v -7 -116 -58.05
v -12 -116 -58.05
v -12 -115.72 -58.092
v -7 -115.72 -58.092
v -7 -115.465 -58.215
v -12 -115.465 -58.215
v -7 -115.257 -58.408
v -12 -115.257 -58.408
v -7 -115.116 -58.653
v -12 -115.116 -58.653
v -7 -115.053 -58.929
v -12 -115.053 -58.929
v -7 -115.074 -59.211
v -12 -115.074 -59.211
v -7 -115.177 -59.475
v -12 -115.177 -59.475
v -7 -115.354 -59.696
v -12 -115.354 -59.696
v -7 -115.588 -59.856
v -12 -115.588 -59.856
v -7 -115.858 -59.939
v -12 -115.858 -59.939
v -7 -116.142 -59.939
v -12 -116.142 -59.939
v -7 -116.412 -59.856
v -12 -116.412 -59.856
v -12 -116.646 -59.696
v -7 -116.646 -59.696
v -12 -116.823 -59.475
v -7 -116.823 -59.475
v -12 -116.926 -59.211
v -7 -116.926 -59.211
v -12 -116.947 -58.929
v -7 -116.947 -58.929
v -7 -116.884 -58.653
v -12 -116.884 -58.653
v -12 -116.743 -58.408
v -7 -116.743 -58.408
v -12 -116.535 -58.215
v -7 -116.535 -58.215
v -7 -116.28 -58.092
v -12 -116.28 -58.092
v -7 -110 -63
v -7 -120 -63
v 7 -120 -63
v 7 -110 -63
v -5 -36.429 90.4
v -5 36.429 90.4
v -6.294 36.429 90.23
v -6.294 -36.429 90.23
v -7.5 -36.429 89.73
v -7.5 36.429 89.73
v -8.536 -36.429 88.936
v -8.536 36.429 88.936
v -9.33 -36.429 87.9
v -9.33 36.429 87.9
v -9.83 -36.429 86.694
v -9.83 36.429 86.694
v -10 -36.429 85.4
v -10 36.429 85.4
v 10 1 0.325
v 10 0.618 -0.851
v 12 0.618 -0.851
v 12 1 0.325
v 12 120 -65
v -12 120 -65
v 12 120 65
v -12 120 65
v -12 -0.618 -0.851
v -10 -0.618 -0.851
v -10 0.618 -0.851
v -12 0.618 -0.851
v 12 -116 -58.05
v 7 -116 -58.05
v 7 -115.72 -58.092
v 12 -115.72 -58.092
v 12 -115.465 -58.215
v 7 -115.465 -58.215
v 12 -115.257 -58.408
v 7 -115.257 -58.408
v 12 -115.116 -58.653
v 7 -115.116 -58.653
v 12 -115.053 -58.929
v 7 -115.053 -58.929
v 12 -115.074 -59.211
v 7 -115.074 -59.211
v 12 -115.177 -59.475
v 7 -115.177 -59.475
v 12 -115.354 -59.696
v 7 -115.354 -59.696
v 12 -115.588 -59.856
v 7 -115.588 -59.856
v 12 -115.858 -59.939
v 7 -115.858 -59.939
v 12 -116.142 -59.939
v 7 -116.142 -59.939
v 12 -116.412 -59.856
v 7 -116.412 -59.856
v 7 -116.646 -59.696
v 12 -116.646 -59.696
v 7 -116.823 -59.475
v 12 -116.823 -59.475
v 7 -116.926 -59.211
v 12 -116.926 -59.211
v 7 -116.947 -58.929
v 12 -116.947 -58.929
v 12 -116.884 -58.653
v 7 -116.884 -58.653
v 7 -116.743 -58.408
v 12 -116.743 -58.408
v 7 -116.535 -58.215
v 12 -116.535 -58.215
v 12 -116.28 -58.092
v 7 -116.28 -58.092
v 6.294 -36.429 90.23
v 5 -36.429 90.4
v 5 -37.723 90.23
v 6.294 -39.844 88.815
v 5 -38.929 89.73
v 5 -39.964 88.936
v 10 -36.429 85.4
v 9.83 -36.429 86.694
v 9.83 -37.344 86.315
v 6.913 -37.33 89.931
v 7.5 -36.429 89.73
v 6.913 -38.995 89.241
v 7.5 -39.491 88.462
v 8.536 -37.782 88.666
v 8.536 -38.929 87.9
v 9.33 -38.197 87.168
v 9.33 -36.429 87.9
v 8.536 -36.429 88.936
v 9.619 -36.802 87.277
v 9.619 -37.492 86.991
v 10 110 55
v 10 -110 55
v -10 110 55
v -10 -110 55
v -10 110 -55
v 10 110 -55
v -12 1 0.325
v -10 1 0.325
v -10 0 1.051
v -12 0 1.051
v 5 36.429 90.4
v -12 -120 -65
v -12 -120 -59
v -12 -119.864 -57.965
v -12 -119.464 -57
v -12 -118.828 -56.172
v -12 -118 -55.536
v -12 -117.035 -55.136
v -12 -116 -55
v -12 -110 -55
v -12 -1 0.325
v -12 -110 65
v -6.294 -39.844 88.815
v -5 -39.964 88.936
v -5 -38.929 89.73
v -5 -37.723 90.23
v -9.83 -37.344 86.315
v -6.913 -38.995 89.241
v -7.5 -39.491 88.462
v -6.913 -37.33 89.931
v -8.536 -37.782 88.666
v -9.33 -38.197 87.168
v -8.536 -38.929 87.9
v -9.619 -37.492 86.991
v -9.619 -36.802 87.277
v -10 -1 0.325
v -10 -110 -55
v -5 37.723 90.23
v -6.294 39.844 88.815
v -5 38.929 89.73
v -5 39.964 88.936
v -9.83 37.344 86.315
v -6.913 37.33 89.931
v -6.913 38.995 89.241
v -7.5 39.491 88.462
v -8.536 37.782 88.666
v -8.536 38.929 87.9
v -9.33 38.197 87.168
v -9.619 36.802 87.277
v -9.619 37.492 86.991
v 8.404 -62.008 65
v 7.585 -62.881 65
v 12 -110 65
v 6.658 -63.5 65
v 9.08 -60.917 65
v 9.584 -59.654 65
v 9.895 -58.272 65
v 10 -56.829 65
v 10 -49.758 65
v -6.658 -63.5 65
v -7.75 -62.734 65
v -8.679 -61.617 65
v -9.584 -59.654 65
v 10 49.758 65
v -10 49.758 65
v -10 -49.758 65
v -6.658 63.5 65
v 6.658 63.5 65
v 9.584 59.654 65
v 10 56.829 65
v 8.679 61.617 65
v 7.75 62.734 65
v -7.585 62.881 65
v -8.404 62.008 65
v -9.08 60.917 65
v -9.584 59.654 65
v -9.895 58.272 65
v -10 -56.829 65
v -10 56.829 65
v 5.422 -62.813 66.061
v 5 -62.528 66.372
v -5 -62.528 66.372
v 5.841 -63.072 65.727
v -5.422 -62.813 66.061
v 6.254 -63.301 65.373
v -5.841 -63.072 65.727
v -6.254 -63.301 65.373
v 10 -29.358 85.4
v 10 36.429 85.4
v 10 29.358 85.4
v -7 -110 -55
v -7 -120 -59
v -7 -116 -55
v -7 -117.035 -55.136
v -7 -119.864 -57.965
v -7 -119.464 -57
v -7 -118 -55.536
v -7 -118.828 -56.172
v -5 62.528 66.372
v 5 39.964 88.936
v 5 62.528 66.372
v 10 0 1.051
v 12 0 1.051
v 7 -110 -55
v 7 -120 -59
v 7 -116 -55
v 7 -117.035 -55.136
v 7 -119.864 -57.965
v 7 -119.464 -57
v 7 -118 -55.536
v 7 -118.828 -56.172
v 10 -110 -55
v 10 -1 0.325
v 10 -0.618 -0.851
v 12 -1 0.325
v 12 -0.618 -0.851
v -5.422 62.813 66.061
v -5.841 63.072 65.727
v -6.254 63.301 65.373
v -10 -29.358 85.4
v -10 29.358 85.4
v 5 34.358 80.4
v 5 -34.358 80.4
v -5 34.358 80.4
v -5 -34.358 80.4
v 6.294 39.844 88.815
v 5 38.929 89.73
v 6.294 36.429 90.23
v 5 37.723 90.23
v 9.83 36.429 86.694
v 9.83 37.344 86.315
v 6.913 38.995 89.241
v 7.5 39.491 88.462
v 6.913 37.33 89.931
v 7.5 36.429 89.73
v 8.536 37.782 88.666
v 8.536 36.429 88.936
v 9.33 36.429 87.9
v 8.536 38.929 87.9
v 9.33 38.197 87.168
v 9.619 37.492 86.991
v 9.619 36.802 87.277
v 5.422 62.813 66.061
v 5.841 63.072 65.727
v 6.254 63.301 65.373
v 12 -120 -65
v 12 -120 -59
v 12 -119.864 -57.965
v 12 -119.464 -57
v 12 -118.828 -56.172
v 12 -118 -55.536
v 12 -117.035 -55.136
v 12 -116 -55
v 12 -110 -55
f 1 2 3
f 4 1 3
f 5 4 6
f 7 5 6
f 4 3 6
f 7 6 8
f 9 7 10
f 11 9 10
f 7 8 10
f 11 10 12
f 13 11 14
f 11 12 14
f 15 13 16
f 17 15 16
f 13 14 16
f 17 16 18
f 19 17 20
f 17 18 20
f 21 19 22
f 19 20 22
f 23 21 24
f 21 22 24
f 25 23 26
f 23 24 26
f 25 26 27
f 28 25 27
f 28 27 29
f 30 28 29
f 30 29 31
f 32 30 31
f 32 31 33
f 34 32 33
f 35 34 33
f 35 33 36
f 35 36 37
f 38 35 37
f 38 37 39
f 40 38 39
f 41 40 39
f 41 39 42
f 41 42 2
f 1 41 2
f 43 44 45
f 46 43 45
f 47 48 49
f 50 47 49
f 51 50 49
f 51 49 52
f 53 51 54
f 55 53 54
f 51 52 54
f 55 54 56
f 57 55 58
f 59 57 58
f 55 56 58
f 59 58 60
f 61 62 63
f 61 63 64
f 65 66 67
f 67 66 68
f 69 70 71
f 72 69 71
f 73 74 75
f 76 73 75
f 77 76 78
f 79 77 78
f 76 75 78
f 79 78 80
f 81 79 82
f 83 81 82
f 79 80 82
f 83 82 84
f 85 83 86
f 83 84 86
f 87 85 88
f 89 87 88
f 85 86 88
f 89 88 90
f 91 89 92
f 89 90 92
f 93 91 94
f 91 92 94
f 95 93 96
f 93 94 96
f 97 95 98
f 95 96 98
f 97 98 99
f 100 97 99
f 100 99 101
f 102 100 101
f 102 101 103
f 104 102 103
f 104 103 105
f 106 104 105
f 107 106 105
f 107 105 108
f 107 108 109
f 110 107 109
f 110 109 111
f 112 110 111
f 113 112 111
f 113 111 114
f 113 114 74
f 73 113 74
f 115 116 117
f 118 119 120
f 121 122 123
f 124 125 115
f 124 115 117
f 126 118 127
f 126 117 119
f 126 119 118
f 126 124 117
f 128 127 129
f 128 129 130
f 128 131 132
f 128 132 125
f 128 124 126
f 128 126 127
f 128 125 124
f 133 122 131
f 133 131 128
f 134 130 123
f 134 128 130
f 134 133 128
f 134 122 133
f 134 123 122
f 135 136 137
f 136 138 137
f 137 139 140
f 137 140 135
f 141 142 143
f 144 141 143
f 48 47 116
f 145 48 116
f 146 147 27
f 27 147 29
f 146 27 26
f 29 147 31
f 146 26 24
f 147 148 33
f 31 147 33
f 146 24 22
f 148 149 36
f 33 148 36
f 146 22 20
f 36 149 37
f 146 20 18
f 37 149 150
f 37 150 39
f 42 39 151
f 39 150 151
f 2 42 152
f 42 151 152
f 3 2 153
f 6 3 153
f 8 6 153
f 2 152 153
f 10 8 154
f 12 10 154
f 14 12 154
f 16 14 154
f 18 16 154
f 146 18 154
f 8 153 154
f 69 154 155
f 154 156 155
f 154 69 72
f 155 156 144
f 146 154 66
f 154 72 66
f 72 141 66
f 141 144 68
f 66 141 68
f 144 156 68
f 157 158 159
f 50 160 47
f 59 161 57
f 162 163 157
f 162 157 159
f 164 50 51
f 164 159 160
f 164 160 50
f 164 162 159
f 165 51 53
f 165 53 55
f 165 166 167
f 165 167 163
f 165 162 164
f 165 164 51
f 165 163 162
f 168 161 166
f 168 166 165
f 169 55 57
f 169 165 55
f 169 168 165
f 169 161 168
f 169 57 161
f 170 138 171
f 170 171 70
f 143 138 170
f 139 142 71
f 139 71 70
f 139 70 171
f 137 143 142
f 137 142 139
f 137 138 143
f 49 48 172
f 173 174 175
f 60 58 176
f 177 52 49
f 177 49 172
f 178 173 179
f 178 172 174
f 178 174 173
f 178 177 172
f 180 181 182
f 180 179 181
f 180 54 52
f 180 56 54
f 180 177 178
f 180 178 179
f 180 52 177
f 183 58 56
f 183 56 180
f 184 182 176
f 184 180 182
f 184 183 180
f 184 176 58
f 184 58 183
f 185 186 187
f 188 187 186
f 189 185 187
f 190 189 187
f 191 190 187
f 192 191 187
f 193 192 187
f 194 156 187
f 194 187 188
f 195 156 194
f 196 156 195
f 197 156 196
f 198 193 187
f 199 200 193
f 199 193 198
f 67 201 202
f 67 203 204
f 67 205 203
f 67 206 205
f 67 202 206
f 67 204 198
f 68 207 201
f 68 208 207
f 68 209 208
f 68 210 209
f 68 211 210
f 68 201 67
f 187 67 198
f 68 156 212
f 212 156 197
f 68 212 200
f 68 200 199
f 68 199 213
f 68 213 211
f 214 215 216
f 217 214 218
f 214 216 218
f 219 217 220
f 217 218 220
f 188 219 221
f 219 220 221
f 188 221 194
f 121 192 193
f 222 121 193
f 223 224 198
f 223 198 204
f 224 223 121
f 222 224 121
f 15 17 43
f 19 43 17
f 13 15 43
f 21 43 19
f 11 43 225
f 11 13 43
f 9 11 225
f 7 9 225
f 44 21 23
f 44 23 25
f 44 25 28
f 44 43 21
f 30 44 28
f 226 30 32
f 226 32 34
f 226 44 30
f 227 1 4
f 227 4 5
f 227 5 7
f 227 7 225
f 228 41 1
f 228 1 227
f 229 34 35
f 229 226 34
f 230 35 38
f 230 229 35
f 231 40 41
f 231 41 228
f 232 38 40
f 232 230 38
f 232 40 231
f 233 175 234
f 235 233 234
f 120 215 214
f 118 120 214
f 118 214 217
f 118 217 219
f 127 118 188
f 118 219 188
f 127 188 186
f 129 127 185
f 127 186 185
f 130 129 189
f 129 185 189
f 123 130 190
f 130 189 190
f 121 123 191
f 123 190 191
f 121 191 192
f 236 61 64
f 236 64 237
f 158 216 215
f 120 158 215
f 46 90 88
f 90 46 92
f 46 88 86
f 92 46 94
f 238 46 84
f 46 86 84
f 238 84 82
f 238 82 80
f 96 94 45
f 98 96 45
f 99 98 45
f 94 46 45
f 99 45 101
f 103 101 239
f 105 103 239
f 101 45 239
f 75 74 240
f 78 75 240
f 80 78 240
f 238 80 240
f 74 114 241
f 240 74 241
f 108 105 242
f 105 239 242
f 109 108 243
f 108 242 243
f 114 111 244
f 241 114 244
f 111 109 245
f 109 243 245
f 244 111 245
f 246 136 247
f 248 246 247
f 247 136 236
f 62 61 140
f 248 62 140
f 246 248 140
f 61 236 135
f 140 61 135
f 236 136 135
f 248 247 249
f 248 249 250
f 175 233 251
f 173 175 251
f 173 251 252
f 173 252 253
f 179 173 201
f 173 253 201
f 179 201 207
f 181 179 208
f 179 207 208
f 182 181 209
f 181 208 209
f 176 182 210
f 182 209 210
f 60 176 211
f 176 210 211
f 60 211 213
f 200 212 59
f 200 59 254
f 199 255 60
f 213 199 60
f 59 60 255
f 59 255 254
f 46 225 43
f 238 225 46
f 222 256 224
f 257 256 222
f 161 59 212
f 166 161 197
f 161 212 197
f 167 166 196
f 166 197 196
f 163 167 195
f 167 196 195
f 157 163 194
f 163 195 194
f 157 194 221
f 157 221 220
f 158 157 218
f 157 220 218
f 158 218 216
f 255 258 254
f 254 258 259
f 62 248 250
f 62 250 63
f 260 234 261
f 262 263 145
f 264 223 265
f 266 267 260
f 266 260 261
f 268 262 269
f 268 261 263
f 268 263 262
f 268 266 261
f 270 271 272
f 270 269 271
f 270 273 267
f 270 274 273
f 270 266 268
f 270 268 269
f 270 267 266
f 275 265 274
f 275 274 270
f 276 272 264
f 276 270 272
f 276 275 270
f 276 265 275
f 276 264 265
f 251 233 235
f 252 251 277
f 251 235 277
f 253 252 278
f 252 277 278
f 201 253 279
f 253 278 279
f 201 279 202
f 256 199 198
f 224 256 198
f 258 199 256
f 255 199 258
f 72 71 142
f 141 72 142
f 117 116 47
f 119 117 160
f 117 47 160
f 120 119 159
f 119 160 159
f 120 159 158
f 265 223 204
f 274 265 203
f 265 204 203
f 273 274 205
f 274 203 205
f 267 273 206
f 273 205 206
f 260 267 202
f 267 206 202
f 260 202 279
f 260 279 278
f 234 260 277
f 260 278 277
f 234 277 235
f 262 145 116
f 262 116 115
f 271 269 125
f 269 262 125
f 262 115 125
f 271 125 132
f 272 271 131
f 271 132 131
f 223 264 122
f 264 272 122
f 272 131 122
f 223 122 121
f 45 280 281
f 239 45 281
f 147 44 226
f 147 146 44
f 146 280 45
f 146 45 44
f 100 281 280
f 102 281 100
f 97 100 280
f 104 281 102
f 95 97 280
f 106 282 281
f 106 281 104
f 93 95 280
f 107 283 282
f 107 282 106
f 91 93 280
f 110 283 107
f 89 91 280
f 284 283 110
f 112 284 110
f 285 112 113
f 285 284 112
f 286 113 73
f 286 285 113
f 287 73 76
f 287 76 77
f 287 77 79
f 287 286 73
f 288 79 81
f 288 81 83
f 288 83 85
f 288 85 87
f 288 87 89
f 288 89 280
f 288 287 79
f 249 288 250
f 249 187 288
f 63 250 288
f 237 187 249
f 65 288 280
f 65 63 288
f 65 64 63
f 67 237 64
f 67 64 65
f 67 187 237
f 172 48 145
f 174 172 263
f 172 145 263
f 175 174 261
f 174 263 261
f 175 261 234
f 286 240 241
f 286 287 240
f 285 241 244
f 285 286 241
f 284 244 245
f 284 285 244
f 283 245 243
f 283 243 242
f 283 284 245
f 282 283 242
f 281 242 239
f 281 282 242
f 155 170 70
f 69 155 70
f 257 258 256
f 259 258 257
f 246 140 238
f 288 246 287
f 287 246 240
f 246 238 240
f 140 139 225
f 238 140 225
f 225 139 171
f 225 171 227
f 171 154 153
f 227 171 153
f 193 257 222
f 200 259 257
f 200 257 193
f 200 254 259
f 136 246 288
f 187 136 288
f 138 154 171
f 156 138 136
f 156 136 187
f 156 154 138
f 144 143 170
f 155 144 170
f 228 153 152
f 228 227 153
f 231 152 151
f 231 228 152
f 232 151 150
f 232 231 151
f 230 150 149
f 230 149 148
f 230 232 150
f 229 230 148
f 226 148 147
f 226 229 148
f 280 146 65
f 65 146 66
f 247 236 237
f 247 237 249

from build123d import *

# Parameters (mm, degrees)
SKETCH1_W           = 240
SKETCH1_H           = 130
BOSS_EXTRUDE1_DEPTH = 12
SKETCH2_W           = 220
SKETCH2_H           = 110
CUT_EXTRUDE2_DEPTH  = 10
CUT_EXTRUDE3_DEPTH  = 137.839321834
SKETCH4_W           = 20
SKETCH4_H           = 127
BOSS_EXTRUDE2_DEPTH = 25.4
CHAMFER1_SIZE       = 25
SHELL1_START        = -10
SHELL1_DEPTH        = 20
FILLET1_R           = 5
CHAMFER2_SIZE       = 5
SKETCH6_W           = 10
SKETCH6_H           = 120
CUT_EXTRUDE5_DEPTH  = 153.145193812
SKETCH9_W           = 14
SKETCH9_H           = 8
CUT_EXTRUDE7_DEPTH  = 10
SKETCH11_R          = 0.95
CUT_EXTRUDE8_DEPTH  = 153.145193812
FILLET3_R           = 4


with BuildPart() as part:
    # Sketch1 → Boss-Extrude1 (new body)
    with BuildSketch(Plane.YZ):
        Rectangle(SKETCH1_W, SKETCH1_H)
    extrude(amount=-BOSS_EXTRUDE1_DEPTH)

    # Sketch2 → Cut-Extrude2 (cut)
    with BuildSketch(Plane.YZ):
        Rectangle(SKETCH2_W, SKETCH2_H)
    extrude(amount=-CUT_EXTRUDE2_DEPTH, mode=Mode.SUBTRACT)

    # Sketch3 → Cut-Extrude3 (cut, through all)
    with BuildSketch(Plane.YZ.offset(-10)):
        Polygon((0, 1.051462224), (-1, 0.324919696), (-0.618033989, -0.850650808), (0.618033989, -0.850650808), (1, 0.324919696), align=None)
    extrude(amount=-CUT_EXTRUDE3_DEPTH, mode=Mode.SUBTRACT)

    # Mirror6: part across plane


with BuildPart() as part_1:
    add(part.part)
    add(part.part.mirror(Plane.ZY))

    # Sketch4 → Boss-Extrude2 (add)
    with BuildSketch(Plane.XY.offset(65)):
        Rectangle(SKETCH4_W, SKETCH4_H)
    extrude(amount=BOSS_EXTRUDE2_DEPTH)

    # Chamfer1
    chamfer1_edges = [part_1.edges().sort_by_distance(p)[0] for p in [
        (0, 63.5, 90.4),
        (0, -63.5, 90.4),
    ]]
    chamfer(chamfer1_edges, length=CHAMFER1_SIZE)

    # Shell1: read off the stored shape, not the designer's step
    # Shell1 outline → Shell1 (cut)
    with BuildSketch(Plane.YZ.offset(SHELL1_START)):
        Polygon((-49.757864376, 65), (49.757864376, 65), (34.357864376, 80.4), (-34.357864376, 80.4), align=None)
    extrude(amount=SHELL1_DEPTH, mode=Mode.SUBTRACT)

    # Fillet1
    # the kernel refuses this fillet: 5 mm, written as the material it takes off along each edge
    with BuildSketch(Plane(origin=(5, -36.428932188, 85.4), x_dir=(0, 0, 1), z_dir=(1, 0, 0))) as fillet1_piece_1_section:
        Polygon((0, 0), (FILLET1_R * 1.02, 0), (FILLET1_R * 1.02, FILLET1_R * 0.422497833621), (FILLET1_R * 0.72124891681, FILLET1_R * 0.72124891681), align=None)
    fillet1_piece_1 = extrude(amount=FILLET1_R * 1.02, mode=Mode.PRIVATE)
    fillet1_piece_1 = fillet1_piece_1 - Plane(origin=(5, -36.428932188, 85.4), x_dir=(0, 0.3826834323650898, -0.9238795325112867), z_dir=(1, 0, 0)) * Sphere(FILLET1_R, mode=Mode.PRIVATE)
    add(fillet1_piece_1, mode=Mode.SUBTRACT)
    with BuildSketch(Plane(origin=(-5, -36.428932188, 85.4), x_dir=(0, -0.7071067811865476, 0.7071067811865476), z_dir=(-1, 0, 0))) as fillet1_piece_2_section:
        Polygon((0, 0), (FILLET1_R * 1.02, 0), (FILLET1_R * 1.02, FILLET1_R * 0.422497833621), (FILLET1_R * 0.72124891681, FILLET1_R * 0.72124891681), align=None)
    fillet1_piece_2 = extrude(amount=FILLET1_R * 1.02, mode=Mode.PRIVATE)
    fillet1_piece_2 = fillet1_piece_2 - Plane(origin=(-5, -36.428932188, 85.4), x_dir=(0, 0.3826834323650898, -0.9238795325112867), z_dir=(-1, 0, 0)) * Sphere(FILLET1_R, mode=Mode.PRIVATE)
    add(fillet1_piece_2, mode=Mode.SUBTRACT)
    with BuildSketch(Plane(origin=(-5, 36.428932188, 85.4), x_dir=(0, 0.7071067811865476, 0.7071067811865476), z_dir=(-1, 0, 0))) as fillet1_piece_3_section:
        Polygon((0, 0), (FILLET1_R * 1.02, 0), (FILLET1_R * 1.02, -FILLET1_R * 0.422497833621), (FILLET1_R * 0.72124891681, -FILLET1_R * 0.72124891681), align=None)
    fillet1_piece_3 = extrude(amount=FILLET1_R * 1.02, mode=Mode.PRIVATE)
    fillet1_piece_3 = fillet1_piece_3 - Plane(origin=(-5, 36.428932188, 85.4), x_dir=(0, -0.3826834323650898, -0.9238795325112867), z_dir=(-1, 0, 0)) * Sphere(FILLET1_R, mode=Mode.PRIVATE)
    add(fillet1_piece_3, mode=Mode.SUBTRACT)
    with BuildSketch(Plane(origin=(5, 36.428932188, 85.4), x_dir=(0, 0, 1), z_dir=(1, 0, 0))) as fillet1_piece_4_section:
        Polygon((0, 0), (FILLET1_R * 1.02, 0), (FILLET1_R * 1.02, -FILLET1_R * 0.422497833621), (FILLET1_R * 0.72124891681, -FILLET1_R * 0.72124891681), align=None)
    fillet1_piece_4 = extrude(amount=FILLET1_R * 1.02, mode=Mode.PRIVATE)
    fillet1_piece_4 = fillet1_piece_4 - Plane(origin=(5, 36.428932188, 85.4), x_dir=(0, -0.3826834323650898, -0.9238795325112867), z_dir=(1, 0, 0)) * Sphere(FILLET1_R, mode=Mode.PRIVATE)
    add(fillet1_piece_4, mode=Mode.SUBTRACT)
    with BuildSketch(Plane(origin=(10, -72.338834765, 56.561165235), x_dir=(-1, 0, 0), z_dir=(0, 0.7071067811865476, 0.7071067811865476))) as fillet1_piece_5_section:
        with BuildLine():
            CenterArc((FILLET1_R, -FILLET1_R), FILLET1_R, 90, 90)
            Line((0, -FILLET1_R), (0, 0))
            Line((0, 0), (FILLET1_R, 0))
        make_face()
    fillet1_piece_5 = extrude(amount=45.784271247, mode=Mode.PRIVATE)
    fillet1_piece_5 = split(fillet1_piece_5, bisect_by=Plane(origin=(10, -72.338834765, 65), z_dir=(0, 0, 1)), keep=Keep.TOP, mode=Mode.PRIVATE)
    add(fillet1_piece_5, mode=Mode.SUBTRACT)
    with BuildSketch(Plane(origin=(-13.437488438, -63.5, 65.4), x_dir=(0, 0, -1), z_dir=(1, 0, 0)), Plane(origin=(13.437488438, 63.5, 65.4), x_dir=(0, 0, -1), z_dir=(-1, 0, 0))) as fillet1_piece_6:
        with BuildLine():
            CenterArc((2.563265352, 4.50780246), FILLET1_R, 225, 19.363951138)
            Line((-0.972268554, 0.972268554), (0, 0))
            Line((0, 0), (0.4, 0))
        make_face()
    extrude(amount=26.874976876, mode=Mode.SUBTRACT)
    with BuildSketch(Plane(origin=(-10, -72.338834765, 56.561165235), x_dir=(0, 0.7071067811865476, -0.7071067811865476), z_dir=(0, 0.7071067811865476, 0.7071067811865476))) as fillet1_piece_7_section:
        with BuildLine():
            CenterArc((FILLET1_R, -FILLET1_R), FILLET1_R, 90, 90)
            Line((0, -FILLET1_R), (0, 0))
            Line((0, 0), (FILLET1_R, 0))
        make_face()
    fillet1_piece_7 = extrude(amount=45.784271247, mode=Mode.PRIVATE)
    fillet1_piece_7 = split(fillet1_piece_7, bisect_by=Plane(origin=(-10, -72.338834765, 65), z_dir=(0, 0, 1)), keep=Keep.TOP, mode=Mode.PRIVATE)
    add(fillet1_piece_7, mode=Mode.SUBTRACT)
    with BuildSketch(Plane(origin=(-5, -38.5, 90.4), x_dir=(0, -0.7071067811865476, -0.7071067811865476), z_dir=(1, 0, 0))) as fillet1_piece_8:
        with BuildLine():
            CenterArc((FILLET1_R * 0.414213562373, FILLET1_R), FILLET1_R, 225, 45)
            Line((-FILLET1_R * 0.292893218813, FILLET1_R * 0.292893218813), (0, 0))
            Line((0, 0), (FILLET1_R * 0.414213562373, 0))
        make_face()
    extrude(amount=10, mode=Mode.SUBTRACT)
    with BuildSketch(Plane(origin=(-10, 36.428932188, 90.4), x_dir=(0, 0, -1), z_dir=(0, -1, 0)), Plane(origin=(10, -36.428932188, 90.4), x_dir=(0, 0, -1), z_dir=(0, 1, 0))) as fillet1_piece_9:
        with BuildLine():
            CenterArc((FILLET1_R, FILLET1_R), FILLET1_R, 180, 90)
            Line((0, FILLET1_R), (0, 0))
            Line((0, 0), (FILLET1_R, 0))
        make_face()
    extrude(amount=72.857864376, mode=Mode.SUBTRACT)
    with BuildSketch(Plane(origin=(5, 38.5, 90.4), x_dir=(0, -1, 0), z_dir=(-1, 0, 0))) as fillet1_piece_10:
        with BuildLine():
            CenterArc((FILLET1_R * 0.414213562373, -FILLET1_R), FILLET1_R, 90, 45)
            Line((-FILLET1_R * 0.292893218813, -FILLET1_R * 0.292893218813), (0, 0))
            Line((0, 0), (FILLET1_R * 0.414213562373, 0))
        make_face()
    extrude(amount=10, mode=Mode.SUBTRACT)
    with BuildSketch(Plane(origin=(-10, 72.338834765, 56.561165235), x_dir=(0, -0.7071067811865476, -0.7071067811865476), z_dir=(0, -0.7071067811865476, 0.7071067811865476))) as fillet1_piece_11_section:
        with BuildLine():
            CenterArc((FILLET1_R, FILLET1_R), FILLET1_R, 180, 90)
            Line((0, FILLET1_R), (0, 0))
            Line((0, 0), (FILLET1_R, 0))
        make_face()
    fillet1_piece_11 = extrude(amount=45.784271247, mode=Mode.PRIVATE)
    fillet1_piece_11 = split(fillet1_piece_11, bisect_by=Plane(origin=(-10, 72.338834765, 65), z_dir=(0, 0, 1)), keep=Keep.TOP, mode=Mode.PRIVATE)
    add(fillet1_piece_11, mode=Mode.SUBTRACT)
    with BuildSketch(Plane(origin=(10, 72.338834765, 56.561165235), x_dir=(0, -0.7071067811865476, -0.7071067811865476), z_dir=(0, -0.7071067811865476, 0.7071067811865476))) as fillet1_piece_12_section:
        with BuildLine():
            CenterArc((FILLET1_R, -FILLET1_R), FILLET1_R, 90, 90)
            Line((0, -FILLET1_R), (0, 0))
            Line((0, 0), (FILLET1_R, 0))
        make_face()
    fillet1_piece_12 = extrude(amount=45.784271247, mode=Mode.PRIVATE)
    fillet1_piece_12 = split(fillet1_piece_12, bisect_by=Plane(origin=(10, 72.338834765, 65), z_dir=(0, 0, 1)), keep=Keep.TOP, mode=Mode.PRIVATE)
    add(fillet1_piece_12, mode=Mode.SUBTRACT)

    # Chamfer2
    chamfer2_edges = [part_1.edges().sort_by_distance(p)[0] for p in [
        (10, 0, 80.4),
        (-10, 0, 80.4),
    ]]
    chamfer(chamfer2_edges, length=CHAMFER2_SIZE - 0.0001)  # a hair under: the kernel refuses the full size

    # Sketch6 → Cut-Extrude5 (cut, through all)
    with BuildSketch(Plane(origin=(-12, 0, 0), x_dir=(0, -1, 0), z_dir=(-1, 0, 0))):
        with Locations((115, 5)):
            Rectangle(SKETCH6_W, SKETCH6_H)
    extrude(amount=-CUT_EXTRUDE5_DEPTH, mode=Mode.SUBTRACT)

    # Sketch9 → Cut-Extrude7 (cut)
    with BuildSketch(Plane.XZ.offset(120)):
        with Locations((0, -59)):
            Rectangle(SKETCH9_W, SKETCH9_H)
    extrude(amount=-CUT_EXTRUDE7_DEPTH, mode=Mode.SUBTRACT)

    # Sketch11 → Cut-Extrude8 (cut, through all)
    with BuildSketch(Plane(origin=(-12, 0, 0), x_dir=(0, -1, 0), z_dir=(-1, 0, 0))):
        with Locations(Location((116, -59, 0), (0, 0, 90))):
            Circle(SKETCH11_R)
    extrude(amount=-CUT_EXTRUDE8_DEPTH, mode=Mode.SUBTRACT)

    # Fillet3
    fillet3_edges = [part_1.edges().sort_by_distance(p)[0] for p in [
        (9.5, -120, -55),
        (-9.5, -120, -55),
    ]]
    fillet(fillet3_edges, radius=FILLET3_R)


solid = part_1.part
